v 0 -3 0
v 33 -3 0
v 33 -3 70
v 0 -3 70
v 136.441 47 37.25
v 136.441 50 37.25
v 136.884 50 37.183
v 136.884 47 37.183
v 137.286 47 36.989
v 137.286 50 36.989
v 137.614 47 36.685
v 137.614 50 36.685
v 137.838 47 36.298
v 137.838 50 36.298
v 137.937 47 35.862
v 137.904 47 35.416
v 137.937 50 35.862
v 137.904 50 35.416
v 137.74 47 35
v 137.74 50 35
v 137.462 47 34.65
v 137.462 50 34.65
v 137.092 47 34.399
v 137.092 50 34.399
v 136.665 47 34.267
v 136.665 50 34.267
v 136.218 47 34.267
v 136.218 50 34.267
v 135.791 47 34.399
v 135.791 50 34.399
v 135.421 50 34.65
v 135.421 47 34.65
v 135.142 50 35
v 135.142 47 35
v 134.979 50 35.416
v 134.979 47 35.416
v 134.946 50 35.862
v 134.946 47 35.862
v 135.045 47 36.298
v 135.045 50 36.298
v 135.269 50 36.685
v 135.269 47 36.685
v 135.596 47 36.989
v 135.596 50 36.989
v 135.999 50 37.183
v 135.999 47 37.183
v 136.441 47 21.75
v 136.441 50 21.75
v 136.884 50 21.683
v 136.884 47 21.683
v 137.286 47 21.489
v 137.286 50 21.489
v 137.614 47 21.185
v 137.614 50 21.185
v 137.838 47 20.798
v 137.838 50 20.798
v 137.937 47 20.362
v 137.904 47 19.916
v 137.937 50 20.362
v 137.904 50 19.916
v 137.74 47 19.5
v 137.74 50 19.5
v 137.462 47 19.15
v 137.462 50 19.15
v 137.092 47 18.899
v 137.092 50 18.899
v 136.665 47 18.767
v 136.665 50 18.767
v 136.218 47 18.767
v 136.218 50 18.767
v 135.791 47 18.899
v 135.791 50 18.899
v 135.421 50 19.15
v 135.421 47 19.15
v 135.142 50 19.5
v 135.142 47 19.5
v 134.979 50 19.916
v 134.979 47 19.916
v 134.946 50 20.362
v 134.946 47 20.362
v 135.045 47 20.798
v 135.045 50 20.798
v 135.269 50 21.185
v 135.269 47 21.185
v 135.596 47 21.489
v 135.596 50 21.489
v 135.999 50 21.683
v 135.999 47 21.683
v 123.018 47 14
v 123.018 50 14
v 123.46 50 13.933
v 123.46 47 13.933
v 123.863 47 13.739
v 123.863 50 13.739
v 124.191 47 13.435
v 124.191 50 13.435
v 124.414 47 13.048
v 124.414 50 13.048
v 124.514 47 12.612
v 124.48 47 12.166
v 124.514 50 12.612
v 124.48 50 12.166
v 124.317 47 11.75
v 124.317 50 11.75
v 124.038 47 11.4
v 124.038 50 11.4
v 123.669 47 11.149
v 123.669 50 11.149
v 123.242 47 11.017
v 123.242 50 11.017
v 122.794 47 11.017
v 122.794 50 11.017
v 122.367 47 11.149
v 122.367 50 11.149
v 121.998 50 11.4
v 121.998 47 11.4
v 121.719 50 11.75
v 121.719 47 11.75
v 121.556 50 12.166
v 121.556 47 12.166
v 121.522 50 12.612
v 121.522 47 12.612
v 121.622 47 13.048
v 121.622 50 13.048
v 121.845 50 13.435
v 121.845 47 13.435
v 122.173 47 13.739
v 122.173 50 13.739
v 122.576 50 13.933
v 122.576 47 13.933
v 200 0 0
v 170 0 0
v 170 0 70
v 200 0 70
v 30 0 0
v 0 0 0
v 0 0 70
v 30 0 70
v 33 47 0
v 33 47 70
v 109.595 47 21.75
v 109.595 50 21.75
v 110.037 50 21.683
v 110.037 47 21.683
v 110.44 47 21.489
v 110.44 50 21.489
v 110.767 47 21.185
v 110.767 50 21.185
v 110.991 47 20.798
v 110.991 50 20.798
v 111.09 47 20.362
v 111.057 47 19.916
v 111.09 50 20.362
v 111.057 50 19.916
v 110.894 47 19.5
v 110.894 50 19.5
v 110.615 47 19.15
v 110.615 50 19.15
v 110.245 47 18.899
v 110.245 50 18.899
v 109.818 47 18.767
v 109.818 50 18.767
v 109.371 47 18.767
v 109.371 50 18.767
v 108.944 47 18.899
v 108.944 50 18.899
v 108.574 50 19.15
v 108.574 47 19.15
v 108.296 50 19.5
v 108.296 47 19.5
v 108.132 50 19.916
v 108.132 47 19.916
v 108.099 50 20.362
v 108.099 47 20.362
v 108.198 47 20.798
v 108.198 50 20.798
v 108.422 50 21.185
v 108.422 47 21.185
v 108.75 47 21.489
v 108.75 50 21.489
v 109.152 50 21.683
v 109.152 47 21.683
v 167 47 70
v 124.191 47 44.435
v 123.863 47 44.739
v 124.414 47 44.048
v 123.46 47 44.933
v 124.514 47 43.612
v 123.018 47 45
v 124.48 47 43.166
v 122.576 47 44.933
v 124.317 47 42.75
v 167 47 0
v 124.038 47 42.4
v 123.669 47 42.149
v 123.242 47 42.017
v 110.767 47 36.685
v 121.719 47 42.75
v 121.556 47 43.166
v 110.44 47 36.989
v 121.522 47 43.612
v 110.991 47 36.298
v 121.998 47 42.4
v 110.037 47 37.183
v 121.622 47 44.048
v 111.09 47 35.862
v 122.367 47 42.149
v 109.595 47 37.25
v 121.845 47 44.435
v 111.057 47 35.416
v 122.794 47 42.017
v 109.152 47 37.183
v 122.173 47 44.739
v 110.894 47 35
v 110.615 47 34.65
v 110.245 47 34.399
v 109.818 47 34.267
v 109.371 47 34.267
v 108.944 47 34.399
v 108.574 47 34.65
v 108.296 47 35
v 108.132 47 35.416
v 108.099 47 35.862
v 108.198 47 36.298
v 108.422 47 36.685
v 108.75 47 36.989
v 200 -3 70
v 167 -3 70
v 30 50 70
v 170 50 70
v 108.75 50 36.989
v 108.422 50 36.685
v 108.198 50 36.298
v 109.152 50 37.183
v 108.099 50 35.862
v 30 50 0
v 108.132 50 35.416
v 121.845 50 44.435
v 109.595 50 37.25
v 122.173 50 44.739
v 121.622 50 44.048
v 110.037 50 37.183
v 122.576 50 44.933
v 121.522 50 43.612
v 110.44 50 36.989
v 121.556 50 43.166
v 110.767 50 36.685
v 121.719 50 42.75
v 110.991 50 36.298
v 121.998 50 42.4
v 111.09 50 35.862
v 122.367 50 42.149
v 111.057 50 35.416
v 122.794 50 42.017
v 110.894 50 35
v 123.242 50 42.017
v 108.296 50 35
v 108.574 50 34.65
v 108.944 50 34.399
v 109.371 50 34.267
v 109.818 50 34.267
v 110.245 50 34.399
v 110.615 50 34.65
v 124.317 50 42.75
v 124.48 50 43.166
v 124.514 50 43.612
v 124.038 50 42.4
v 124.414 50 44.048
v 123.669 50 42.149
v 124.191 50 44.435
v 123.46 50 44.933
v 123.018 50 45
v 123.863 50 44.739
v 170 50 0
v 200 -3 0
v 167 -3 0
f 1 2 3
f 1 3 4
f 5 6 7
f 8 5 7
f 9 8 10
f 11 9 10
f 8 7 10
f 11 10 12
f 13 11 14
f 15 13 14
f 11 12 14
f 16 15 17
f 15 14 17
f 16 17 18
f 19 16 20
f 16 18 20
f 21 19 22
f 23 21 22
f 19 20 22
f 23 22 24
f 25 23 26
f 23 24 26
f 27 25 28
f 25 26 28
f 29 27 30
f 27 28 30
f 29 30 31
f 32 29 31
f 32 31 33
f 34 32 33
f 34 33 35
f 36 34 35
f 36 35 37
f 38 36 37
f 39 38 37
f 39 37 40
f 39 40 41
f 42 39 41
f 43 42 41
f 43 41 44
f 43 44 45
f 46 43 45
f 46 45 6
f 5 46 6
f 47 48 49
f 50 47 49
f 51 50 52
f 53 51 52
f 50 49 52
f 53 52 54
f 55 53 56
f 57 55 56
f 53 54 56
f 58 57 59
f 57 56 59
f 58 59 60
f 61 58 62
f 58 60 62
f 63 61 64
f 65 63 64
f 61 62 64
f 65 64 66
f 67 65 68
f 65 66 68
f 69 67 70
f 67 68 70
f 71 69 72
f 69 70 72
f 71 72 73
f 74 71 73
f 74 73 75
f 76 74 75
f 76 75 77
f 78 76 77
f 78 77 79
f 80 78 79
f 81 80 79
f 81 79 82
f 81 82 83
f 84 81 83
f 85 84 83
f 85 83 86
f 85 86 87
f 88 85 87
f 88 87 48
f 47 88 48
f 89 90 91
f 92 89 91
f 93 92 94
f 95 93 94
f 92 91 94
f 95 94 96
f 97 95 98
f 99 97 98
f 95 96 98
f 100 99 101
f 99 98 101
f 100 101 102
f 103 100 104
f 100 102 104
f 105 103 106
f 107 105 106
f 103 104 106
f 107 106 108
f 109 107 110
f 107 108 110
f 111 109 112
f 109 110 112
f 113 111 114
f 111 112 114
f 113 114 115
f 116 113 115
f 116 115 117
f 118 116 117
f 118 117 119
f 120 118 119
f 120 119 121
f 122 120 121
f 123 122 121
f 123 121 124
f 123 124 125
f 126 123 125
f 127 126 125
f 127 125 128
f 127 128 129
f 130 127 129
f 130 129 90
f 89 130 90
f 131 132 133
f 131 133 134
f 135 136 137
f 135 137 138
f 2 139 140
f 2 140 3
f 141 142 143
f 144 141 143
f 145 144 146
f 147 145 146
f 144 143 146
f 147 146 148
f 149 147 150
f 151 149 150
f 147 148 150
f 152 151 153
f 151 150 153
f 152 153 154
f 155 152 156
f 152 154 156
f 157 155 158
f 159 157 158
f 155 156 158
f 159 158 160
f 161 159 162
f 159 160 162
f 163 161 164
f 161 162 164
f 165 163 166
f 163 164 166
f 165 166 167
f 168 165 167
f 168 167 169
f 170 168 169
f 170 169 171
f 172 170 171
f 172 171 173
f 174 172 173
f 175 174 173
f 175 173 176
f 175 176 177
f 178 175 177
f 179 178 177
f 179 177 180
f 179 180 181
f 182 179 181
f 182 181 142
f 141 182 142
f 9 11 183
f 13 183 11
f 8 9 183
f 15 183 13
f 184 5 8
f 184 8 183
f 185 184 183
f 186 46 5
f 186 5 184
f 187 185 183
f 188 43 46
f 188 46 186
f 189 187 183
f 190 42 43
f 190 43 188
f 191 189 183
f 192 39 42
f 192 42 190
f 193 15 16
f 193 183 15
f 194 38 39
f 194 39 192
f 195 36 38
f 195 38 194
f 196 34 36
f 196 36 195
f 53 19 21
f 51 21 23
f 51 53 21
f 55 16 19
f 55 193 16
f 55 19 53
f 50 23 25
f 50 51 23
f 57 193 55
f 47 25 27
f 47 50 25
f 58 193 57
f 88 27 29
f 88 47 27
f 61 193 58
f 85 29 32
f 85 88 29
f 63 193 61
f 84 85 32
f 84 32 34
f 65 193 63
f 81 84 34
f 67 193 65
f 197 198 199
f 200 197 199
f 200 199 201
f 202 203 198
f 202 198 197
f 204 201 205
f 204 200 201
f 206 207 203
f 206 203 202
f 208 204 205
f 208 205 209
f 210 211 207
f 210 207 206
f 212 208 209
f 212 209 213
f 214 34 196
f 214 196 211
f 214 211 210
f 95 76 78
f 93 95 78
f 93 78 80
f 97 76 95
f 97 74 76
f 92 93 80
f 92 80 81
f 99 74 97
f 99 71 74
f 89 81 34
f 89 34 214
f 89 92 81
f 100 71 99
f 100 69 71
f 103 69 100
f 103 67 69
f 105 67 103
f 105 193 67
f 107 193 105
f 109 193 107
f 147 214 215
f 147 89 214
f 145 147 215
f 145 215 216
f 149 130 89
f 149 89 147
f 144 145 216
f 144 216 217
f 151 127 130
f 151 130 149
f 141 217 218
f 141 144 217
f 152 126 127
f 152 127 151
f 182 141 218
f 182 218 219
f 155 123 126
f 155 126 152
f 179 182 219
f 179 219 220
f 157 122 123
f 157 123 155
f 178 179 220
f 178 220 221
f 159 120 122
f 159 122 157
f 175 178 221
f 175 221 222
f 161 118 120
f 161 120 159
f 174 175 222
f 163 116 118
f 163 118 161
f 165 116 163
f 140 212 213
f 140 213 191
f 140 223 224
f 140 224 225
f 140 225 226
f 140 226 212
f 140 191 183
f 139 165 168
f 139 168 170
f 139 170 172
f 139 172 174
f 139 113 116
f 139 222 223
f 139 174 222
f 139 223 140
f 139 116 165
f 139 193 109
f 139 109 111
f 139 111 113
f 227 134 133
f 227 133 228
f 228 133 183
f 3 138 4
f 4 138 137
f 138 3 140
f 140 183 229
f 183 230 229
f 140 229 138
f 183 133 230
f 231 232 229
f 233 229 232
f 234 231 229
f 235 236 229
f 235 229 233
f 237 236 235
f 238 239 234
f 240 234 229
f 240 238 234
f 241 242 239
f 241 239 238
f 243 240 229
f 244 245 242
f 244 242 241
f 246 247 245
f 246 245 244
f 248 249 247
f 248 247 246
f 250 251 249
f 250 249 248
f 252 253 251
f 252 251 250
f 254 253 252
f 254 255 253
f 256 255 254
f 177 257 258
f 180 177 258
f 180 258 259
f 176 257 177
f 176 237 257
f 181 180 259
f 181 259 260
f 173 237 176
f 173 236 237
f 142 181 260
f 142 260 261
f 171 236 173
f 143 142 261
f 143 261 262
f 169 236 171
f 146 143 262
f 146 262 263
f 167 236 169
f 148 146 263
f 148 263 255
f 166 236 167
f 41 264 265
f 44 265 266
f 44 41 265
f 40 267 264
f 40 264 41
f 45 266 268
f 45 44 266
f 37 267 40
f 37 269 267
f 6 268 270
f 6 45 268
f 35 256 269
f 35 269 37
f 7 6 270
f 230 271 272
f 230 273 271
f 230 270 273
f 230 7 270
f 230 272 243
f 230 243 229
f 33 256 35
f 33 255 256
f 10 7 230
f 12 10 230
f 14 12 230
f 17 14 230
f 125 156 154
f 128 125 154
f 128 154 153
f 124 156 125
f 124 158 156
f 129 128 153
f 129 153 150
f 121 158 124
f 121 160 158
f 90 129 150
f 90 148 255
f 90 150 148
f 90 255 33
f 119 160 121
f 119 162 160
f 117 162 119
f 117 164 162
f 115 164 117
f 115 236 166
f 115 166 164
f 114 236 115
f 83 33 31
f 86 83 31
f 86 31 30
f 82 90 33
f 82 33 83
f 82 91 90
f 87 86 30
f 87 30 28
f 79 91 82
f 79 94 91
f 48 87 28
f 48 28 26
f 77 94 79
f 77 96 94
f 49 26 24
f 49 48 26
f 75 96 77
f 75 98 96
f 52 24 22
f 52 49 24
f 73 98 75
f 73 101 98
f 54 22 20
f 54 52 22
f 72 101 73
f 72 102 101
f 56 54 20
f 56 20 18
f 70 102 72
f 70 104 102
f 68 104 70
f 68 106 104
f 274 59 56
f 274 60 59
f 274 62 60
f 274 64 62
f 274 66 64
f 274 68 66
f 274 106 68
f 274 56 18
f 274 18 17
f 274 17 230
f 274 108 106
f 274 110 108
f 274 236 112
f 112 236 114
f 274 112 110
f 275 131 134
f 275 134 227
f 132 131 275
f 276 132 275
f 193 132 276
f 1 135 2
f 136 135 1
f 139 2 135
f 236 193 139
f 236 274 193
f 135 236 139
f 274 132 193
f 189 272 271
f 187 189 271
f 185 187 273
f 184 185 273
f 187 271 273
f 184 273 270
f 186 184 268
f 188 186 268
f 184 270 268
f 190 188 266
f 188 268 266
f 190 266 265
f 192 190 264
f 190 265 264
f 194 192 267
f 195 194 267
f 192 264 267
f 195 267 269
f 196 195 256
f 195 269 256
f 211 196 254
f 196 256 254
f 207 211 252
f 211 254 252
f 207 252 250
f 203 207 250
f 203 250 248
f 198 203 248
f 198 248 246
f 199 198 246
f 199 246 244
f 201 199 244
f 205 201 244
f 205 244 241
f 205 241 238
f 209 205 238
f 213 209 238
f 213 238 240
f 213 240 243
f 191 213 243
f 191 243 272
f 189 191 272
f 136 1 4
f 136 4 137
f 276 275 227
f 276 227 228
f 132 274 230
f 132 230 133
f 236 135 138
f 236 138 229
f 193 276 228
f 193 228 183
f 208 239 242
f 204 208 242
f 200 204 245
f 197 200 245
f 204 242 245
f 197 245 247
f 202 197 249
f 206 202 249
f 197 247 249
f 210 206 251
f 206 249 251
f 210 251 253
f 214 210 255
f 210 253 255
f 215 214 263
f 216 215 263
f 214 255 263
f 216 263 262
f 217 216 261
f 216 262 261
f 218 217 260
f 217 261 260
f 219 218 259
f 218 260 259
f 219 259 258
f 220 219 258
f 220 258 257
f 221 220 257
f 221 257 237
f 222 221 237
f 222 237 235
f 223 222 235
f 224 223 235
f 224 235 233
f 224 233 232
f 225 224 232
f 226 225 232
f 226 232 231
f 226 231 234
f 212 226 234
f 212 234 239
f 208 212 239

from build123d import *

# Parameters (mm, degrees)
EXTRUDE_1_DEPTH     = 70
SKETCH_2_R          = 1.5
CUT_EXTRUDE_1_DEPTH = 10


with BuildPart() as part:
    # 草图1 → 凸台-拉伸1 (new body)
    with BuildSketch(Plane.XY):
        Polygon((0, 0), (30, 0), (30, 50), (170, 50), (170, 0), (200, 0), (200, -3), (167, -3), (167, 47), (33, 47), (33, -3), (0, -3), align=None)
    extrude(amount=EXTRUDE_1_DEPTH)

    # 草图2 → 切除-拉伸1 (cut)
    with BuildSketch(Plane(origin=(0, 50, 0), x_dir=(1, 0, 0), z_dir=(0, 1, 0))):
        with Locations(Location((123.018011593, -43.499999999, 0), (0, 0, 270))):
            Circle(SKETCH_2_R)
        with Locations(Location((136.441405352, -35.749999999, 0), (0, 0, 270))):
            Circle(SKETCH_2_R)
        with Locations(Location((136.441405352, -20.249999999, 0), (0, 0, 270))):
            Circle(SKETCH_2_R)
        with Locations(Location((123.018011593, -12.499999999, 0), (0, 0, 270))):
            Circle(SKETCH_2_R)
        with Locations(Location((109.594617835, -35.749999999, 0), (0, 0, 270))):
            Circle(SKETCH_2_R)
        with Locations(Location((109.594617835, -20.249999999, 0), (0, 0, 270))):
            Circle(SKETCH_2_R)
    extrude(amount=-CUT_EXTRUDE_1_DEPTH, mode=Mode.SUBTRACT)


solid = part.part
